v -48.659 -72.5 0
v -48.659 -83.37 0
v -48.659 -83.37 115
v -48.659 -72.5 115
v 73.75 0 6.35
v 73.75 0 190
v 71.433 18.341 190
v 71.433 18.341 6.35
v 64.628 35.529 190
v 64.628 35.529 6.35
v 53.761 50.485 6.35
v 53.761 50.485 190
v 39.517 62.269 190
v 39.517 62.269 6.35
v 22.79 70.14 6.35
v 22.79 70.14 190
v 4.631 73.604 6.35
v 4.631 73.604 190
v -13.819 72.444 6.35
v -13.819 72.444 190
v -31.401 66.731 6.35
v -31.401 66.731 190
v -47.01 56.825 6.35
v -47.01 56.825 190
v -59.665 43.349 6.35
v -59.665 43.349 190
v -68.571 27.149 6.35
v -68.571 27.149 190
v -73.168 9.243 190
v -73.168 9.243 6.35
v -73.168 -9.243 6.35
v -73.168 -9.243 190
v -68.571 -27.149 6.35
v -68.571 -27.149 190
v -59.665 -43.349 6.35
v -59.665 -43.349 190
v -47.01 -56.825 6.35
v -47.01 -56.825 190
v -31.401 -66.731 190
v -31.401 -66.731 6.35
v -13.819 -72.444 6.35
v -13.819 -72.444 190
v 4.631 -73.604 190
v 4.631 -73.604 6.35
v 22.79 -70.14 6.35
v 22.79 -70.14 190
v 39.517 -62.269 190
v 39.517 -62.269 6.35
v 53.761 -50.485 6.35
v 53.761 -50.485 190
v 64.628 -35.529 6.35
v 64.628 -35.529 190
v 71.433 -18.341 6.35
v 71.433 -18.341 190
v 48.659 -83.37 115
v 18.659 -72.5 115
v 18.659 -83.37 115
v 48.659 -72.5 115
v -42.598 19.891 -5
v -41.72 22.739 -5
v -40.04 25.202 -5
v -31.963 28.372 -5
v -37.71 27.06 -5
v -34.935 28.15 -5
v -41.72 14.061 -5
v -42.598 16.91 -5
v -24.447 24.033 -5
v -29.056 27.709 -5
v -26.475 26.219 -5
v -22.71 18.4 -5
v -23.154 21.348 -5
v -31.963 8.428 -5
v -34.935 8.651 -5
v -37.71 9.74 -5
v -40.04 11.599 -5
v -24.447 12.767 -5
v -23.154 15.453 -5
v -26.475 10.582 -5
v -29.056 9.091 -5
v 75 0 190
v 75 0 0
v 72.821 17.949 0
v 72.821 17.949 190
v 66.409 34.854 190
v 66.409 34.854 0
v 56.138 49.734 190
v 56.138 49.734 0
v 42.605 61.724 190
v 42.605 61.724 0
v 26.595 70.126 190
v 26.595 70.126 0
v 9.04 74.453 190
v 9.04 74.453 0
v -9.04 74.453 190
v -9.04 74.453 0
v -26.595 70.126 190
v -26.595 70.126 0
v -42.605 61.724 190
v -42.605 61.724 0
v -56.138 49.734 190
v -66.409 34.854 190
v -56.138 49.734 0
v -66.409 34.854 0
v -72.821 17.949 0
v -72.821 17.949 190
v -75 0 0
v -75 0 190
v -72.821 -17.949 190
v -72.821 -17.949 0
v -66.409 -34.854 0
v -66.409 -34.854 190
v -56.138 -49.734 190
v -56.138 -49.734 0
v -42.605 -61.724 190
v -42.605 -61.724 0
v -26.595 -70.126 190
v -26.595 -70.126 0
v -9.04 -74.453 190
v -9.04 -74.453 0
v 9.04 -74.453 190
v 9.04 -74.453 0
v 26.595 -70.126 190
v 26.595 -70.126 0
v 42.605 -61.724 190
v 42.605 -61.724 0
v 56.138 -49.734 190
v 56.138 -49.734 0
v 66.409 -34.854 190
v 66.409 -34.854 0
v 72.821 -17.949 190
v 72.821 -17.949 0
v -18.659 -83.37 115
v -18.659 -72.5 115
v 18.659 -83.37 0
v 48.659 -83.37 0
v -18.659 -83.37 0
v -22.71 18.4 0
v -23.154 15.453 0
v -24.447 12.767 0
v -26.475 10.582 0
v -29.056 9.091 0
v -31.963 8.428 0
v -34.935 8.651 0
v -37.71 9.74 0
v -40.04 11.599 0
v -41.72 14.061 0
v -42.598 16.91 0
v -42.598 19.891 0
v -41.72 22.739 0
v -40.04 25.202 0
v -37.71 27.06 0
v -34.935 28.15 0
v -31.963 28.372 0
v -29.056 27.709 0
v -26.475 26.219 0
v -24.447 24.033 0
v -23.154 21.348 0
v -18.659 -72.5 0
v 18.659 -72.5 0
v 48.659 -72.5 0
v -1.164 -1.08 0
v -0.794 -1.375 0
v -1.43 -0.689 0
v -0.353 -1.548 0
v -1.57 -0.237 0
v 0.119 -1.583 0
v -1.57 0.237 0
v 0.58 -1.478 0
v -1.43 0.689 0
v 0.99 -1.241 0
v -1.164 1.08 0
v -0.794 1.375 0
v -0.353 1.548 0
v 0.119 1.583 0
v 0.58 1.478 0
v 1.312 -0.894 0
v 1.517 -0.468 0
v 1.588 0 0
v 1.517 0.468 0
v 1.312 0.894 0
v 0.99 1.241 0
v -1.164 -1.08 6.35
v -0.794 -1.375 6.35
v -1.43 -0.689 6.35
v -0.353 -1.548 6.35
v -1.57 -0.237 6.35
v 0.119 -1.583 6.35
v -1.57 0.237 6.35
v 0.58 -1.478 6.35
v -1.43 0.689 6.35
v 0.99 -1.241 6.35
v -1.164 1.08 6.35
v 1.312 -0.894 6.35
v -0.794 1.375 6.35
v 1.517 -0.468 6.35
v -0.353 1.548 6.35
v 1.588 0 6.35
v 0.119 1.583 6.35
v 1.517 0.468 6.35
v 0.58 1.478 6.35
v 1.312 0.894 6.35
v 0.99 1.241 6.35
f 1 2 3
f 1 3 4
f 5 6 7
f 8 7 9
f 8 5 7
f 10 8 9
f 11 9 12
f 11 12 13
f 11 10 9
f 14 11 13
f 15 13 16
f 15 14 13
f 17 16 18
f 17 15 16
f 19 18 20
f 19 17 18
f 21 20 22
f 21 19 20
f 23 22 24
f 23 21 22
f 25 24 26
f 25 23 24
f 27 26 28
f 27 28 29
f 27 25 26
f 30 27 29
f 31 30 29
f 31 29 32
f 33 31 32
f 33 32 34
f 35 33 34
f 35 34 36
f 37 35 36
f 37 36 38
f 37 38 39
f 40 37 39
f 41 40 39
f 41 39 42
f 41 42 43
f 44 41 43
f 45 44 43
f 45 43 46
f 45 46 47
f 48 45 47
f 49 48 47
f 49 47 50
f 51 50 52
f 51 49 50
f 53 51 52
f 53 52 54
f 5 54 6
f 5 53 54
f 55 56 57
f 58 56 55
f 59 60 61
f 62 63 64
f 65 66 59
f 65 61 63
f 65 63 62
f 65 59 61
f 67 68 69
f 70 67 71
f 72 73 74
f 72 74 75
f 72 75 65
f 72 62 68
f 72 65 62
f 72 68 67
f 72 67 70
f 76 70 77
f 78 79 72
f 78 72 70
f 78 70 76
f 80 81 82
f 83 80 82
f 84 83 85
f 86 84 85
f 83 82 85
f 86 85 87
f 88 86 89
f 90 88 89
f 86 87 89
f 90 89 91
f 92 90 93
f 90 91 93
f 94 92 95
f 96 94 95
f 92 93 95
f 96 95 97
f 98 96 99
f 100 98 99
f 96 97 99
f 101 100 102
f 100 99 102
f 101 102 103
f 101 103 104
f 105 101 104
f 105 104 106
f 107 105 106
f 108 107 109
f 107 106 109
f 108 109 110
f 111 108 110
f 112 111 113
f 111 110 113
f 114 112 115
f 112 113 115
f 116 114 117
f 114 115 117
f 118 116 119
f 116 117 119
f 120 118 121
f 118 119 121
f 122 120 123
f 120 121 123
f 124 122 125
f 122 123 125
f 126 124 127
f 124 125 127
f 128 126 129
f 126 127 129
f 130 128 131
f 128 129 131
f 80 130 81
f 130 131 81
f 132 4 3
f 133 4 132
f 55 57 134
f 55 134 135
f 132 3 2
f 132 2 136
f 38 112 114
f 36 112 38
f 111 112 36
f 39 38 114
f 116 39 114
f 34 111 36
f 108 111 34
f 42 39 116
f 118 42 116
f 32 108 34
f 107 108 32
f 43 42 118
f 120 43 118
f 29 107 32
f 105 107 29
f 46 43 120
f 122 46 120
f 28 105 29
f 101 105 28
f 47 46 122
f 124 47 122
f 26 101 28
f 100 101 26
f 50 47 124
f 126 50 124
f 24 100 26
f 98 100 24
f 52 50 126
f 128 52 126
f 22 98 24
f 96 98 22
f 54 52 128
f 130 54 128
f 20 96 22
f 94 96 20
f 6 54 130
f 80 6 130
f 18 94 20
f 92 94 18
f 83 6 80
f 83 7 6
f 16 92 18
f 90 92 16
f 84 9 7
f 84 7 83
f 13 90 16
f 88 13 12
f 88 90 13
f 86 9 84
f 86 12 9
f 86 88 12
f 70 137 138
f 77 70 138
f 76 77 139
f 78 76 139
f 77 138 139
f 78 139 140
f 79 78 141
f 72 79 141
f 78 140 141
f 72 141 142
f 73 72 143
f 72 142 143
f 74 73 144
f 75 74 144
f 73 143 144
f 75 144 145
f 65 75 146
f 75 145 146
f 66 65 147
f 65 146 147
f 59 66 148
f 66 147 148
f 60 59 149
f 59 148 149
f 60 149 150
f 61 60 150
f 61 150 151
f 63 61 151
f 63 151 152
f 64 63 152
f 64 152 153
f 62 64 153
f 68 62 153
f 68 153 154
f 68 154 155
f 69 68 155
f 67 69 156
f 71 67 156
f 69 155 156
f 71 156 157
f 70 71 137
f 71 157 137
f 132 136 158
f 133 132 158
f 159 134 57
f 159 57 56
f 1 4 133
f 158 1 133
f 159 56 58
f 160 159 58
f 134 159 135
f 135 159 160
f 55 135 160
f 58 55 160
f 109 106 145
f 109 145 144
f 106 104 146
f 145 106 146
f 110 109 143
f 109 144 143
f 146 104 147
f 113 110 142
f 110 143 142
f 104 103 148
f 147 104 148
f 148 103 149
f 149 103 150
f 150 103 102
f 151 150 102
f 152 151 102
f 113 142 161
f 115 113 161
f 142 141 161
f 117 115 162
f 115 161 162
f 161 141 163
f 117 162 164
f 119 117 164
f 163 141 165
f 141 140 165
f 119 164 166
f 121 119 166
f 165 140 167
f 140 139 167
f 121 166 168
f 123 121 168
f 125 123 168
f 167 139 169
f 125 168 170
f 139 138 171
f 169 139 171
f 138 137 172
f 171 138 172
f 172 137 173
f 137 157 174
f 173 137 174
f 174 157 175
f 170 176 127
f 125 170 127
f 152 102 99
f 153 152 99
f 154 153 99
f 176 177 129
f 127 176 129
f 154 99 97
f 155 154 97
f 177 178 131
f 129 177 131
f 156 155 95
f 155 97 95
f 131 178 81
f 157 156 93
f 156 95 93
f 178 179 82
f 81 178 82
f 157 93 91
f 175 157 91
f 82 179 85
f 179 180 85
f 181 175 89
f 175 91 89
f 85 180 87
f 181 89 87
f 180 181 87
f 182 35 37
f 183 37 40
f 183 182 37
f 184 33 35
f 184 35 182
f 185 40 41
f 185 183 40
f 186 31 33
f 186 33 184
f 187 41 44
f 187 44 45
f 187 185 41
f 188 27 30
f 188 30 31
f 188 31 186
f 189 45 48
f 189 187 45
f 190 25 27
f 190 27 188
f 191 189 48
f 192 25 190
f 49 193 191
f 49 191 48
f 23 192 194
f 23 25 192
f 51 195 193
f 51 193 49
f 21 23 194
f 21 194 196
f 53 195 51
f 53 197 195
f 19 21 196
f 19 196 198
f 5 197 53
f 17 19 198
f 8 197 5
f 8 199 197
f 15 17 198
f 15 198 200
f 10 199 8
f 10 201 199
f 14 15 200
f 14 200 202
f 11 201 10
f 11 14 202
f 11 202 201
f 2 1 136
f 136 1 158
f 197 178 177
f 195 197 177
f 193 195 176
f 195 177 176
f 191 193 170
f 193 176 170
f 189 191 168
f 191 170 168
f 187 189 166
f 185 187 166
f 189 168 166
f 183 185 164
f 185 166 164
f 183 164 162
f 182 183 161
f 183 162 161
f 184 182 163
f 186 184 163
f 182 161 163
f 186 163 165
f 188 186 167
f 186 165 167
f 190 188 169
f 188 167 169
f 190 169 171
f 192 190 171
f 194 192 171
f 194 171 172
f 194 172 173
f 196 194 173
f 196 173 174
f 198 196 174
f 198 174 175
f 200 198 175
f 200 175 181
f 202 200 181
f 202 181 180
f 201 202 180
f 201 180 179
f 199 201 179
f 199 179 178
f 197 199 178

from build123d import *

# Parameters (mm, degrees)
F1_W     = 30
F1_H     = 10.870239
F2_DEPTH = 115
F0_R     = 75
F0_R_2   = 73.75
F3_DEPTH = 190
F4_DEPTH = 6.35
F5_R     = 1.5875
F6_DEPTH = 190.001
F5_R_2   = 10
F7_DEPTH = 5


with BuildPart() as f2:
    # F1 (on face) → F2 (new body)
    with BuildSketch(Plane.XY):
        with Locations((33.659113, -77.935119)):
            Rectangle(F1_W, F1_H)
        with Locations((-33.659113, -77.935119)):
            Rectangle(F1_W, F1_H)
    extrude(amount=F2_DEPTH)


with BuildPart() as f3:
    # F0 (on Top) → F3 (new body)
    with BuildSketch(Plane.XY):
        Circle(F0_R)
        Circle(F0_R_2, mode=Mode.SUBTRACT)
    extrude(amount=F3_DEPTH)

    # F0 (on Top) → F4 (join)
    with BuildSketch(Plane.XY):
        Circle(F0_R_2)
    extrude(amount=F4_DEPTH)

    # F5 (on face) → F6 (cut, through all)
    with BuildSketch(Plane(origin=(0, 0, 0), x_dir=(1, 0, 0), z_dir=(0, 0, -1))):
        Circle(F5_R)
    extrude(amount=-F6_DEPTH, mode=Mode.SUBTRACT)

    # F5 (on face) → F7 (join)
    with BuildSketch(Plane(origin=(0, 0, 0), x_dir=(1, 0, 0), z_dir=(0, 0, -1))):
        with Locations((-32.709863, -18.400237)):
            Circle(F5_R_2)
    extrude(amount=F7_DEPTH)


solid = Compound([f2.part, f3.part])
